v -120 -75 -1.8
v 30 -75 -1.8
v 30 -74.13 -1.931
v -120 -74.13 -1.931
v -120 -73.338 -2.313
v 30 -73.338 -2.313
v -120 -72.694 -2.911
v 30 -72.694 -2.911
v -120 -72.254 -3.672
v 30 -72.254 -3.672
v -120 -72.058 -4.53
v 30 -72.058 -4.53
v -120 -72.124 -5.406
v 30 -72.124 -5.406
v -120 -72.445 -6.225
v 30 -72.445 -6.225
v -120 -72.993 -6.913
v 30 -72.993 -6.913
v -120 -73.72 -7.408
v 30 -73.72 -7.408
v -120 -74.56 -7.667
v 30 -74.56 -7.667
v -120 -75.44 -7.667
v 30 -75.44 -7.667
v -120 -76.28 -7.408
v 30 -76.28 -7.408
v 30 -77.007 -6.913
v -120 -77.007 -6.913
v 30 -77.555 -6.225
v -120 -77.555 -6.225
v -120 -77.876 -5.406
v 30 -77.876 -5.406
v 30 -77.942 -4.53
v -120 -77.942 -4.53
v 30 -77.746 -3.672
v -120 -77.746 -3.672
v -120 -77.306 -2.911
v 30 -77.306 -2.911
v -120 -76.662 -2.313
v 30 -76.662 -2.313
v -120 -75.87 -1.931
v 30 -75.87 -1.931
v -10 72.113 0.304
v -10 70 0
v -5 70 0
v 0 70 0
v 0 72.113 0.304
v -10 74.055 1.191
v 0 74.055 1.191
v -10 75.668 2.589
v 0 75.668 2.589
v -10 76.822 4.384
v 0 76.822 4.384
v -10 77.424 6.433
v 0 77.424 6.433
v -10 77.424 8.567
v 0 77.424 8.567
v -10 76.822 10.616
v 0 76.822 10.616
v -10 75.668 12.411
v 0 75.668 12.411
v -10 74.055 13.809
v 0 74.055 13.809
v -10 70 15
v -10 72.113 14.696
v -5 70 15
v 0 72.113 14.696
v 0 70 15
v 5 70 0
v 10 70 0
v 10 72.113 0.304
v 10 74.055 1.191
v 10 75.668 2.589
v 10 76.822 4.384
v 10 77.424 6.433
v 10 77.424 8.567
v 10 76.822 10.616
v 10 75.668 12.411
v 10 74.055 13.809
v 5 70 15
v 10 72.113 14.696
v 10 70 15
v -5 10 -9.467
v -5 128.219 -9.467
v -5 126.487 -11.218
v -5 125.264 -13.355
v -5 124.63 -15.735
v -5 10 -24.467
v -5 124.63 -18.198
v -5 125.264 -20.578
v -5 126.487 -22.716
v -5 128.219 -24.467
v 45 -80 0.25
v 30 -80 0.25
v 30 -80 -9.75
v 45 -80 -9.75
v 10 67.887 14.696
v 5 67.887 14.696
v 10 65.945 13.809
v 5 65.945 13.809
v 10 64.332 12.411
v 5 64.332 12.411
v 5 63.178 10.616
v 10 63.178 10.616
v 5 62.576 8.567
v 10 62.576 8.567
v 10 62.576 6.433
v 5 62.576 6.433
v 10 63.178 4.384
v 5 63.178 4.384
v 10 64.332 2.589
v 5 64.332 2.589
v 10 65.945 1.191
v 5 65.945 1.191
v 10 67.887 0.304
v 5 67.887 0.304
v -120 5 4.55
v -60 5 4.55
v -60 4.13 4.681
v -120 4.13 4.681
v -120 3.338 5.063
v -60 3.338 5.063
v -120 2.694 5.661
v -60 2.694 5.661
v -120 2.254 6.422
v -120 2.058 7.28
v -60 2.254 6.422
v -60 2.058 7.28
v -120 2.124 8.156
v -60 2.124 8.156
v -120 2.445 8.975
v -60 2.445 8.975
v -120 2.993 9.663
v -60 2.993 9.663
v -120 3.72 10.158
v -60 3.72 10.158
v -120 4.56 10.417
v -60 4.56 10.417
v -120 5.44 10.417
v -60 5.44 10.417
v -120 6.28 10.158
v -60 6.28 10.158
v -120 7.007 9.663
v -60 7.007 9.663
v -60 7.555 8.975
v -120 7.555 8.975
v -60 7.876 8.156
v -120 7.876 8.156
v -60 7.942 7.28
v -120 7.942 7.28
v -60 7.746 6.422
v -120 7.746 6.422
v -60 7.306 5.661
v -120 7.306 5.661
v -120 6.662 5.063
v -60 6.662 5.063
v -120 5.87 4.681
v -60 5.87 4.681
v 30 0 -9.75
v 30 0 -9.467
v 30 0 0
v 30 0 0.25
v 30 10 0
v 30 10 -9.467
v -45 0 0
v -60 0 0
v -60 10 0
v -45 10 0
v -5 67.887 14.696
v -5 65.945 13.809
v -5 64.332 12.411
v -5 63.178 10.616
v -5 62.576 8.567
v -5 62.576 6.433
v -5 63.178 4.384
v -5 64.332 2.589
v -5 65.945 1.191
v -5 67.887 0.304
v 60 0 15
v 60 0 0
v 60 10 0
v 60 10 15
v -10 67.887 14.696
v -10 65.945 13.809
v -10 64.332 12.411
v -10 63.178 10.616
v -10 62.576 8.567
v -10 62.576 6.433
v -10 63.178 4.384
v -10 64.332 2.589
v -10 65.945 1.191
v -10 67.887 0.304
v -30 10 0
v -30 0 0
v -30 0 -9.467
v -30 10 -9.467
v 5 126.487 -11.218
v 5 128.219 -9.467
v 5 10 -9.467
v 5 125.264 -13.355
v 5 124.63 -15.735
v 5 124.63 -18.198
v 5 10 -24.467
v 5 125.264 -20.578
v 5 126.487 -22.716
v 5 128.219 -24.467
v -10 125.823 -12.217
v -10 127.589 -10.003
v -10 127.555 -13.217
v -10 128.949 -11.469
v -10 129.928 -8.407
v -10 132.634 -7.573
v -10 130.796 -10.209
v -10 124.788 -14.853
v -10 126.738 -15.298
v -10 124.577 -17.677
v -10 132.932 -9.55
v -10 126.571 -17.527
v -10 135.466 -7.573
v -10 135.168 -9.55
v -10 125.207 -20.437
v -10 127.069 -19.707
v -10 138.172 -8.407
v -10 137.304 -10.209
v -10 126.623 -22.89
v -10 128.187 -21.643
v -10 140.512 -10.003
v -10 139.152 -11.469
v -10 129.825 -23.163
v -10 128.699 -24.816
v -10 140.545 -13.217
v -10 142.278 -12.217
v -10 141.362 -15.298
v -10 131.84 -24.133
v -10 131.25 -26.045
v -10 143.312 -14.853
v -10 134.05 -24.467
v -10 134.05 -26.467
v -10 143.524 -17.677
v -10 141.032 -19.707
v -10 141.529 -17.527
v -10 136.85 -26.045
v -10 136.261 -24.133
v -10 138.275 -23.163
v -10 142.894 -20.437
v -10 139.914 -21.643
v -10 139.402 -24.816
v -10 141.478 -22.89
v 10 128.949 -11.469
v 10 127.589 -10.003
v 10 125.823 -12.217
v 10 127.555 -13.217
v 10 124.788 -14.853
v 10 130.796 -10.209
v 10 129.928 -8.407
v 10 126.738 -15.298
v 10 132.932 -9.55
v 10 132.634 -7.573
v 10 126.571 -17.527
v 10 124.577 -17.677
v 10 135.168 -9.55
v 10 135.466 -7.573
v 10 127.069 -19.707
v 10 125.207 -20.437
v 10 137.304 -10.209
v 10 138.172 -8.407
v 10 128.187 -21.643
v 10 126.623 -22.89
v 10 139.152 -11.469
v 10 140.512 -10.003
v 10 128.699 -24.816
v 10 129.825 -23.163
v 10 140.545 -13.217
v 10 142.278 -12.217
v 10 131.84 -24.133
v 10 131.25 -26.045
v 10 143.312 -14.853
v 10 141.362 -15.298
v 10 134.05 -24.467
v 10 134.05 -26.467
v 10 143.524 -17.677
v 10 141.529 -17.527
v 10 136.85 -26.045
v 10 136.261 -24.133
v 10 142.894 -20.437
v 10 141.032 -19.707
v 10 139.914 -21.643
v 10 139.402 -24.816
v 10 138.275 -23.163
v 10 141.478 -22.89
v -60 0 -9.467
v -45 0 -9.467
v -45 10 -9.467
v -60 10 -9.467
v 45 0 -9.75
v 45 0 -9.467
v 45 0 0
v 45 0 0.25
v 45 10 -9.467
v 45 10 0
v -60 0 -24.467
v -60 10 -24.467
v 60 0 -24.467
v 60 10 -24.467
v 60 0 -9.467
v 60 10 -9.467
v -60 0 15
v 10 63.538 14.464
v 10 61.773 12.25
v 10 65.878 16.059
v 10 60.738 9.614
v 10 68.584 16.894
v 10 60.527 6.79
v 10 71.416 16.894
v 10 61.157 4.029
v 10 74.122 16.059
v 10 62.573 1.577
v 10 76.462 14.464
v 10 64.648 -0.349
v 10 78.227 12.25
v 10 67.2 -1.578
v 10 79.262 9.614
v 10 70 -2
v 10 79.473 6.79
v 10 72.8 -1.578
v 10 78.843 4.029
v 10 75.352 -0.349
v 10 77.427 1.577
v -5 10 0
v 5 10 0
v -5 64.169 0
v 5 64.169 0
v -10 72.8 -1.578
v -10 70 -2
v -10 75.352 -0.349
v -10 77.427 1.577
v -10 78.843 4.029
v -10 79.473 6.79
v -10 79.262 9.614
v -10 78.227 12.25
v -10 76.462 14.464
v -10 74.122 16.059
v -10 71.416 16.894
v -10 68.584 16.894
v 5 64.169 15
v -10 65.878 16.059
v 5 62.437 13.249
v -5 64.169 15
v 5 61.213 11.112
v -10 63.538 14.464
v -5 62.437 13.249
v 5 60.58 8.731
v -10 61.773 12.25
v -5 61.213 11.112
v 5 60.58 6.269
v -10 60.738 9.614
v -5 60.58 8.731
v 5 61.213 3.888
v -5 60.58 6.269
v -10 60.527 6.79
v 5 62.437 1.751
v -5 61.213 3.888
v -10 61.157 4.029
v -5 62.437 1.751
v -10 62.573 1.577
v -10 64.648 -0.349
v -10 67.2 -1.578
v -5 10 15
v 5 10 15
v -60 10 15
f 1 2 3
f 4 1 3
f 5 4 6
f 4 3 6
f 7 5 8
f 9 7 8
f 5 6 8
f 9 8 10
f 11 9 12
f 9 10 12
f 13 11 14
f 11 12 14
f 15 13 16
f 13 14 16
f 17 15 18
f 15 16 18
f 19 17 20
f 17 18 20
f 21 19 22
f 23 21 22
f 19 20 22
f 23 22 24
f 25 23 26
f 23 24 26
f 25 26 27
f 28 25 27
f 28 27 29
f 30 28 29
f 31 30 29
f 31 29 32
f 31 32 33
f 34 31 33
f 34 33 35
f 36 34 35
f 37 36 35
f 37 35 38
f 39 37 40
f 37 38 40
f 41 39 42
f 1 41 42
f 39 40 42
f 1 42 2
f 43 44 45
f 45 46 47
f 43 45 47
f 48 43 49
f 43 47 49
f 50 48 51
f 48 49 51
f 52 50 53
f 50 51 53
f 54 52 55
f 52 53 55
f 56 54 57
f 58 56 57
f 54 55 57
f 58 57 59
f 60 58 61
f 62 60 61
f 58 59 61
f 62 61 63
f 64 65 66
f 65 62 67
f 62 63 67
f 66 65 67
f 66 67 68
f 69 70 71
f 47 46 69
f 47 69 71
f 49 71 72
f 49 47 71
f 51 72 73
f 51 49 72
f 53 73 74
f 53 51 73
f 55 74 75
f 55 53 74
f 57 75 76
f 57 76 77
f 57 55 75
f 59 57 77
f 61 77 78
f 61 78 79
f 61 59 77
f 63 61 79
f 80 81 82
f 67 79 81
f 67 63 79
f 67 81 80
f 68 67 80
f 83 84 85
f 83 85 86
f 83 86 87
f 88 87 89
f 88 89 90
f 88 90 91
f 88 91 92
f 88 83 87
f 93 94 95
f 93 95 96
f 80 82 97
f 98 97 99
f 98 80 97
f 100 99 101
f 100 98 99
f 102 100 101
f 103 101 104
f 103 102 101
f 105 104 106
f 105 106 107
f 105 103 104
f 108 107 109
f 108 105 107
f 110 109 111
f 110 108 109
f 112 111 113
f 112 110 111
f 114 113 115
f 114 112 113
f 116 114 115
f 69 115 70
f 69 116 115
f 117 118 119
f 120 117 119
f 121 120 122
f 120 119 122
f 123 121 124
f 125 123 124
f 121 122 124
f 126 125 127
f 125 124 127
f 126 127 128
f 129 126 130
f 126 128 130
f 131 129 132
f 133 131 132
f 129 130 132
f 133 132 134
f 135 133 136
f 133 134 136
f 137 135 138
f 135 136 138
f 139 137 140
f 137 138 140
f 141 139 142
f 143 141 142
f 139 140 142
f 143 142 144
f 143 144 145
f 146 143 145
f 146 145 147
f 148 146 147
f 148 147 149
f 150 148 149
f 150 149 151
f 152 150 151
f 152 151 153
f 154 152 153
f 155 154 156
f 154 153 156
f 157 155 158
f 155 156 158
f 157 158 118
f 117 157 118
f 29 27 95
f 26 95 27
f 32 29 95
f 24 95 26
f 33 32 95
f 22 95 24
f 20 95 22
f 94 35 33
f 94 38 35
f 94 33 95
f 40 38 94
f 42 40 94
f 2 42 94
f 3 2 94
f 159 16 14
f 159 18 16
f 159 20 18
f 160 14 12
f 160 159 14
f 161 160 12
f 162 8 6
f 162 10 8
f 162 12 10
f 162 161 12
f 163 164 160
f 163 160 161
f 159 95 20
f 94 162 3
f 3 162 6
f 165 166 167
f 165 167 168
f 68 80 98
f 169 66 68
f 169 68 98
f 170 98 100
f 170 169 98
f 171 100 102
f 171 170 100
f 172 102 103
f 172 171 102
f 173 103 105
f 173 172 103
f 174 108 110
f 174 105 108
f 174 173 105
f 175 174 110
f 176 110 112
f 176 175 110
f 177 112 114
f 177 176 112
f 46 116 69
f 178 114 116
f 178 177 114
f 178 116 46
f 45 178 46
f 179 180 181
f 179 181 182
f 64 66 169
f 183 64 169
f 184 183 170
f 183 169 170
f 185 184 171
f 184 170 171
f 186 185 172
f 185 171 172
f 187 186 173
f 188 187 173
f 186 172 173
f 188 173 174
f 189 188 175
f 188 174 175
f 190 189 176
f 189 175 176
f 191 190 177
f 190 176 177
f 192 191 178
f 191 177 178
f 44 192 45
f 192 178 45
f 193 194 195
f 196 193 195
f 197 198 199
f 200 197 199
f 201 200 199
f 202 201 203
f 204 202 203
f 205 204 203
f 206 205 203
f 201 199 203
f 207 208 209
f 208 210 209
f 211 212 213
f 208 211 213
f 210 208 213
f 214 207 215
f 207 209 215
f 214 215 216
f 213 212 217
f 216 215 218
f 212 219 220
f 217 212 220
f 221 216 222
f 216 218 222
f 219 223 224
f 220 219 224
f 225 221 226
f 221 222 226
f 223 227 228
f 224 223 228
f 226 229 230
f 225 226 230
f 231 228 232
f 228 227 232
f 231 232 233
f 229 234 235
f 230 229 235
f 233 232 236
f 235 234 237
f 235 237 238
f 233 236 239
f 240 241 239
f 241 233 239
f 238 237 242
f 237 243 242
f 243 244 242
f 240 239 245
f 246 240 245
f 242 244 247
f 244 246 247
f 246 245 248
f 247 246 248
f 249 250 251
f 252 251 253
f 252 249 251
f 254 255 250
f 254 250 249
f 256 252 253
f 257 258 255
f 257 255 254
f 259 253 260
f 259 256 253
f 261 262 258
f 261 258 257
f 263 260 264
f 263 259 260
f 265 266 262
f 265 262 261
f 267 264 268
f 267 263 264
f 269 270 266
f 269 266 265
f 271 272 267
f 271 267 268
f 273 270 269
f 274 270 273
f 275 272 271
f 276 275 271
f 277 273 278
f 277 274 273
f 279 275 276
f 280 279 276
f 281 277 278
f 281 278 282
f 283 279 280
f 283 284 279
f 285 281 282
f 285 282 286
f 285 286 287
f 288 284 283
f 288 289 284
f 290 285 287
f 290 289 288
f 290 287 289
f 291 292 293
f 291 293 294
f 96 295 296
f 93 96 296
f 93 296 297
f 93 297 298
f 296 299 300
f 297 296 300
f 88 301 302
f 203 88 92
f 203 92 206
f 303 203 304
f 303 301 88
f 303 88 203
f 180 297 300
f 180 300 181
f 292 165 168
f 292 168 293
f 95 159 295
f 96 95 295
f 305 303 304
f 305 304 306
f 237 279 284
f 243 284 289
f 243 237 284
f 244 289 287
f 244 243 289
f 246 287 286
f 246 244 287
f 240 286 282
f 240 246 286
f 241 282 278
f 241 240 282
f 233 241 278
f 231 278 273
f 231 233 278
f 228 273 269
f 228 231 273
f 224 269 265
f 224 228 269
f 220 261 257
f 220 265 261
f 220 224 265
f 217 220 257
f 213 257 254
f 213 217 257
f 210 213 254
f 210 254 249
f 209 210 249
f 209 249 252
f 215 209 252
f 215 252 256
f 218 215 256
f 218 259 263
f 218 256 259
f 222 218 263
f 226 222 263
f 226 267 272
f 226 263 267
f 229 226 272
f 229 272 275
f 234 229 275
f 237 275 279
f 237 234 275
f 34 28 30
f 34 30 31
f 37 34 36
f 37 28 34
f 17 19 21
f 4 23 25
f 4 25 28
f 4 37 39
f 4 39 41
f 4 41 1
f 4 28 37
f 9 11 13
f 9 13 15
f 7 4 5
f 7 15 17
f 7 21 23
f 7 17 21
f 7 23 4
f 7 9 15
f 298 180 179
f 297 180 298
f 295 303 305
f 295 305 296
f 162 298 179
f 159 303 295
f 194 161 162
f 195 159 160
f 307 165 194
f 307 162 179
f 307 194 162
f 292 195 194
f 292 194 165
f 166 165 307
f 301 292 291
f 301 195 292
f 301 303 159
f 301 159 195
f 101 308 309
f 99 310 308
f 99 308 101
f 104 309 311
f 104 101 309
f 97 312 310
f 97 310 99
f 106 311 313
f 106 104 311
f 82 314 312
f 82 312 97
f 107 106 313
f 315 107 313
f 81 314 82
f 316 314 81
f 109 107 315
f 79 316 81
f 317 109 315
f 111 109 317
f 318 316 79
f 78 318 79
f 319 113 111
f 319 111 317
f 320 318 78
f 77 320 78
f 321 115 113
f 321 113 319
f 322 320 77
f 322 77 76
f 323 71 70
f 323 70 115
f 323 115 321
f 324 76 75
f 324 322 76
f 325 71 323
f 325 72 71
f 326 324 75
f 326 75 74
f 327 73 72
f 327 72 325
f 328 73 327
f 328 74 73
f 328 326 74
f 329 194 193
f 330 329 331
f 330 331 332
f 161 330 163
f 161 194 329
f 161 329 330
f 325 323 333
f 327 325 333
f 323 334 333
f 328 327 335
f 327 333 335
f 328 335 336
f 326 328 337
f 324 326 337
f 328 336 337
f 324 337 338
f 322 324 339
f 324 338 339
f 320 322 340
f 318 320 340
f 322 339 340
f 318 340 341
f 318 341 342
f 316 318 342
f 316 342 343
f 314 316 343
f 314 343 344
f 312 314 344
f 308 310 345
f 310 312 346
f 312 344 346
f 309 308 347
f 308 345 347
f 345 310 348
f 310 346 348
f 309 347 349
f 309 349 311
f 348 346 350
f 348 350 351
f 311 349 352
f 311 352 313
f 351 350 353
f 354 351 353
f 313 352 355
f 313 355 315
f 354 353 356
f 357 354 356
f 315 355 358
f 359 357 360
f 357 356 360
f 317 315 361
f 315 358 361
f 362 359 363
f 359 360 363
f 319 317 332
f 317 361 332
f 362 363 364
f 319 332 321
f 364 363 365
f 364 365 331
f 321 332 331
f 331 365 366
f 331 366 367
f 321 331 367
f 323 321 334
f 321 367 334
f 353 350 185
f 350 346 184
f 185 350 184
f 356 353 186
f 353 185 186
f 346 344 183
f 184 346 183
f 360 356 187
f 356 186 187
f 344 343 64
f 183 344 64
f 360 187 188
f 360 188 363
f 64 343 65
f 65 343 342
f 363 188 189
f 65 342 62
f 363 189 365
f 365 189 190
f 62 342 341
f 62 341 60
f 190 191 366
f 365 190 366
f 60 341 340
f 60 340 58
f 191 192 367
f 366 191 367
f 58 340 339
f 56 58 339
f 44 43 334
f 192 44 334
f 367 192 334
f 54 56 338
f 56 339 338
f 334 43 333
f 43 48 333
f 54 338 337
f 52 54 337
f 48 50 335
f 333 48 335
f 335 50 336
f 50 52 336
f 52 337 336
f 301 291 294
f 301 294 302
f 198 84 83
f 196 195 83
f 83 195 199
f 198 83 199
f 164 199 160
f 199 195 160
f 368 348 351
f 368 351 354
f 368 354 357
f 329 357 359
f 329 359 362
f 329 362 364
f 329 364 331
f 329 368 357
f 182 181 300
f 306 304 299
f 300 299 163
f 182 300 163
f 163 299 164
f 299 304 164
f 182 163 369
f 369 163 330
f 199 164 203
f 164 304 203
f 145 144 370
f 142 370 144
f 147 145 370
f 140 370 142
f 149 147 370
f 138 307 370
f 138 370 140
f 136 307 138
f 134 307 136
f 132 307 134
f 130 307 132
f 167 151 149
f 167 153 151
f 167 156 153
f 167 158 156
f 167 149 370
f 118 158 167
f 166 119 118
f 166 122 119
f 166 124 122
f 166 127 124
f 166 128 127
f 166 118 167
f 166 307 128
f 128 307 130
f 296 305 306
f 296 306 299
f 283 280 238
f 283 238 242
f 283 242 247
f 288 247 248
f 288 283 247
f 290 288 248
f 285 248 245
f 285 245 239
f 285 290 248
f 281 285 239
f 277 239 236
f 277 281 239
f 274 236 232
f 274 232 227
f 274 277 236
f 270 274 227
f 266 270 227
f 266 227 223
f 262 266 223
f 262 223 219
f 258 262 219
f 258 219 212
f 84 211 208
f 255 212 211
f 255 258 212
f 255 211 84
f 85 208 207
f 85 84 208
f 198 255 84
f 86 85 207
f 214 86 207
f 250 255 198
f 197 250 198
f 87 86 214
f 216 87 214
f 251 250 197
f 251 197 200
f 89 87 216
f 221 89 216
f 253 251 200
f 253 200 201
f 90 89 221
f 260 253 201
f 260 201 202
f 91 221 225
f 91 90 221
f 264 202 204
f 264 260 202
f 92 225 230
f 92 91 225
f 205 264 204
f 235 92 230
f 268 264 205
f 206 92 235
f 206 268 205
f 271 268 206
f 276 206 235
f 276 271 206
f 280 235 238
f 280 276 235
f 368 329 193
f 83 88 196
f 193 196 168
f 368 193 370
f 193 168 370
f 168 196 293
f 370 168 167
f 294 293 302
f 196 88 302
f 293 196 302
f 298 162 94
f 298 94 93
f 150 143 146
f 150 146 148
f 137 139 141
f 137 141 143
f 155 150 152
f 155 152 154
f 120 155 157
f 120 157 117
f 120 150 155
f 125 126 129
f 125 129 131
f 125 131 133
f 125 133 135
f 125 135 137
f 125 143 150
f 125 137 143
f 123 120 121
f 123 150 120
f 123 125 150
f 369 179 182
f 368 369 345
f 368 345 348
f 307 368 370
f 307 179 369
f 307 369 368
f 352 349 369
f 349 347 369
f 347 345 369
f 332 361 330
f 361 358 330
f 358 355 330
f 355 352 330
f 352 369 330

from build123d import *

# Parameters (mm, degrees)
SKETCH2_W               = 60
SKETCH2_H               = 9.4666089
BOSS_EXTRUDE2_DEPTH     = 10
SKETCH3_W               = 10
SKETCH3_H               = 15
BOSS_EXTRUDE3_DEPTH     = 60
SKETCH4_W               = 10
SKETCH4_H               = 15
BOSS_EXTRUDE4_DEPTH     = 64.0502592
SKETCH6_R               = 9.5
SKETCH6_R_2             = 7.5
EXTRUDE_THIN1_DEPTH     = 10
CUT_EXTRUDE1_DEPTH      = 160.787854054
CUT_EXTRUDE1_DEPTH_BACK = 160.787854054
SKETCH8_W               = 15
SKETCH8_H               = 10
BOSS_EXTRUDE5_DEPTH     = 80
SKETCH9_R               = 2.95
BOSS_EXTRUDE6_DEPTH     = 150
SKETCH10_R              = 2.95
BOSS_EXTRUDE7_DEPTH     = 60


with BuildPart() as part:
    # Sketch2 → Boss-Extrude2 (new body)
    with BuildSketch(Plane(origin=(0, 0, 0), x_dir=(1, 0, 0), z_dir=(0, 1, 0))):
        Polygon((60, -15), (-60, -15), (-60, 0), (-45, 0), (-45, 9.4666089), (-60, 9.4666089), (-60, 24.4666089), (60, 24.4666089), (60, 9.4666089), (45, 9.4666089), (45, 0), (60, 0), align=None)
        with Locations((0, 4.73330445)):
            Rectangle(SKETCH2_W, SKETCH2_H, mode=Mode.SUBTRACT)
    extrude(amount=BOSS_EXTRUDE2_DEPTH)

    # Sketch3 → Boss-Extrude3 (add)
    with BuildSketch(Plane(origin=(0, 10, 0), x_dir=(1, 0, 0), z_dir=(0, 1, 0))):
        with Locations((0, -7.5)):
            Rectangle(SKETCH3_W, SKETCH3_H)
        with Locations((0, 16.9666089)):
            Rectangle(SKETCH3_W, SKETCH3_H)
    extrude(amount=BOSS_EXTRUDE3_DEPTH)

    # Sketch4 → Boss-Extrude4 (add)
    with BuildSketch(Plane(origin=(0, 70, 0), x_dir=(1, 0, 0), z_dir=(0, 1, 0))):
        with Locations((0, 16.9666089)):
            Rectangle(SKETCH4_W, SKETCH4_H)
    extrude(amount=BOSS_EXTRUDE4_DEPTH)

    # Sketch6 → Extrude-Thin1 (add, symmetric)
    # profile 1 of 2: a face of its own
    with BuildSketch(Plane(origin=(0, 0, 0), x_dir=(0, 0, -1), z_dir=(1, 0, 0))):
        with Locations((-7.5, 70)):
            Circle(SKETCH6_R)
        with Locations((-7.5, 70)):
            Circle(SKETCH6_R_2, mode=Mode.SUBTRACT)
    # profile 2 of 2: a face of its own
    with BuildSketch(Plane(origin=(0, 0, 0), x_dir=(0, 0, -1), z_dir=(1, 0, 0))):
        with Locations((16.9666089, 134.0502592)):
            Circle(SKETCH6_R)
        with Locations((16.9666089, 134.0502592)):
            Circle(SKETCH6_R_2, mode=Mode.SUBTRACT)
    extrude(amount=EXTRUDE_THIN1_DEPTH, both=True)

    # Sketch7 → Cut-Extrude1 (cut, two sides: drawn at the far end of the back side and taken through both)
    with BuildSketch(Plane(origin=(5, 0, 0), x_dir=(0, 0, -1), z_dir=(1, 0, 0)).offset(-CUT_EXTRUDE1_DEPTH_BACK)):
        with BuildLine():
            Line((0, 70), (-15, 70))
            ThreePointArc((-15, 70), (-7.5, 62.5), (0, 70))
        make_face()
        with BuildLine():
            Line((24.4666089, 134.0502592), (9.4666089, 134.0502592))
            ThreePointArc((9.4666089, 134.0502592), (16.9666089, 126.5502592), (24.4666089, 134.0502592))
        make_face()
    extrude(amount=CUT_EXTRUDE1_DEPTH + CUT_EXTRUDE1_DEPTH_BACK, mode=Mode.SUBTRACT)

    # Sketch8 → Boss-Extrude5 (add)
    with BuildSketch(Plane.XZ):
        with Locations((37.5, -4.75)):
            Rectangle(SKETCH8_W, SKETCH8_H)
    extrude(amount=BOSS_EXTRUDE5_DEPTH)

    # Sketch9 → Boss-Extrude6 (add)
    with BuildSketch(Plane.ZY.offset(-30)):
        with Locations((-4.75, -75)):
            Circle(SKETCH9_R)
    extrude(amount=BOSS_EXTRUDE6_DEPTH)

    # Sketch10 → Boss-Extrude7 (add)
    with BuildSketch(Plane.ZY.offset(60)):
        with Locations(Location((7.5, 5, 0), (0, 0, 180))):
            Circle(SKETCH10_R)
    extrude(amount=BOSS_EXTRUDE7_DEPTH)


solid = part.part
